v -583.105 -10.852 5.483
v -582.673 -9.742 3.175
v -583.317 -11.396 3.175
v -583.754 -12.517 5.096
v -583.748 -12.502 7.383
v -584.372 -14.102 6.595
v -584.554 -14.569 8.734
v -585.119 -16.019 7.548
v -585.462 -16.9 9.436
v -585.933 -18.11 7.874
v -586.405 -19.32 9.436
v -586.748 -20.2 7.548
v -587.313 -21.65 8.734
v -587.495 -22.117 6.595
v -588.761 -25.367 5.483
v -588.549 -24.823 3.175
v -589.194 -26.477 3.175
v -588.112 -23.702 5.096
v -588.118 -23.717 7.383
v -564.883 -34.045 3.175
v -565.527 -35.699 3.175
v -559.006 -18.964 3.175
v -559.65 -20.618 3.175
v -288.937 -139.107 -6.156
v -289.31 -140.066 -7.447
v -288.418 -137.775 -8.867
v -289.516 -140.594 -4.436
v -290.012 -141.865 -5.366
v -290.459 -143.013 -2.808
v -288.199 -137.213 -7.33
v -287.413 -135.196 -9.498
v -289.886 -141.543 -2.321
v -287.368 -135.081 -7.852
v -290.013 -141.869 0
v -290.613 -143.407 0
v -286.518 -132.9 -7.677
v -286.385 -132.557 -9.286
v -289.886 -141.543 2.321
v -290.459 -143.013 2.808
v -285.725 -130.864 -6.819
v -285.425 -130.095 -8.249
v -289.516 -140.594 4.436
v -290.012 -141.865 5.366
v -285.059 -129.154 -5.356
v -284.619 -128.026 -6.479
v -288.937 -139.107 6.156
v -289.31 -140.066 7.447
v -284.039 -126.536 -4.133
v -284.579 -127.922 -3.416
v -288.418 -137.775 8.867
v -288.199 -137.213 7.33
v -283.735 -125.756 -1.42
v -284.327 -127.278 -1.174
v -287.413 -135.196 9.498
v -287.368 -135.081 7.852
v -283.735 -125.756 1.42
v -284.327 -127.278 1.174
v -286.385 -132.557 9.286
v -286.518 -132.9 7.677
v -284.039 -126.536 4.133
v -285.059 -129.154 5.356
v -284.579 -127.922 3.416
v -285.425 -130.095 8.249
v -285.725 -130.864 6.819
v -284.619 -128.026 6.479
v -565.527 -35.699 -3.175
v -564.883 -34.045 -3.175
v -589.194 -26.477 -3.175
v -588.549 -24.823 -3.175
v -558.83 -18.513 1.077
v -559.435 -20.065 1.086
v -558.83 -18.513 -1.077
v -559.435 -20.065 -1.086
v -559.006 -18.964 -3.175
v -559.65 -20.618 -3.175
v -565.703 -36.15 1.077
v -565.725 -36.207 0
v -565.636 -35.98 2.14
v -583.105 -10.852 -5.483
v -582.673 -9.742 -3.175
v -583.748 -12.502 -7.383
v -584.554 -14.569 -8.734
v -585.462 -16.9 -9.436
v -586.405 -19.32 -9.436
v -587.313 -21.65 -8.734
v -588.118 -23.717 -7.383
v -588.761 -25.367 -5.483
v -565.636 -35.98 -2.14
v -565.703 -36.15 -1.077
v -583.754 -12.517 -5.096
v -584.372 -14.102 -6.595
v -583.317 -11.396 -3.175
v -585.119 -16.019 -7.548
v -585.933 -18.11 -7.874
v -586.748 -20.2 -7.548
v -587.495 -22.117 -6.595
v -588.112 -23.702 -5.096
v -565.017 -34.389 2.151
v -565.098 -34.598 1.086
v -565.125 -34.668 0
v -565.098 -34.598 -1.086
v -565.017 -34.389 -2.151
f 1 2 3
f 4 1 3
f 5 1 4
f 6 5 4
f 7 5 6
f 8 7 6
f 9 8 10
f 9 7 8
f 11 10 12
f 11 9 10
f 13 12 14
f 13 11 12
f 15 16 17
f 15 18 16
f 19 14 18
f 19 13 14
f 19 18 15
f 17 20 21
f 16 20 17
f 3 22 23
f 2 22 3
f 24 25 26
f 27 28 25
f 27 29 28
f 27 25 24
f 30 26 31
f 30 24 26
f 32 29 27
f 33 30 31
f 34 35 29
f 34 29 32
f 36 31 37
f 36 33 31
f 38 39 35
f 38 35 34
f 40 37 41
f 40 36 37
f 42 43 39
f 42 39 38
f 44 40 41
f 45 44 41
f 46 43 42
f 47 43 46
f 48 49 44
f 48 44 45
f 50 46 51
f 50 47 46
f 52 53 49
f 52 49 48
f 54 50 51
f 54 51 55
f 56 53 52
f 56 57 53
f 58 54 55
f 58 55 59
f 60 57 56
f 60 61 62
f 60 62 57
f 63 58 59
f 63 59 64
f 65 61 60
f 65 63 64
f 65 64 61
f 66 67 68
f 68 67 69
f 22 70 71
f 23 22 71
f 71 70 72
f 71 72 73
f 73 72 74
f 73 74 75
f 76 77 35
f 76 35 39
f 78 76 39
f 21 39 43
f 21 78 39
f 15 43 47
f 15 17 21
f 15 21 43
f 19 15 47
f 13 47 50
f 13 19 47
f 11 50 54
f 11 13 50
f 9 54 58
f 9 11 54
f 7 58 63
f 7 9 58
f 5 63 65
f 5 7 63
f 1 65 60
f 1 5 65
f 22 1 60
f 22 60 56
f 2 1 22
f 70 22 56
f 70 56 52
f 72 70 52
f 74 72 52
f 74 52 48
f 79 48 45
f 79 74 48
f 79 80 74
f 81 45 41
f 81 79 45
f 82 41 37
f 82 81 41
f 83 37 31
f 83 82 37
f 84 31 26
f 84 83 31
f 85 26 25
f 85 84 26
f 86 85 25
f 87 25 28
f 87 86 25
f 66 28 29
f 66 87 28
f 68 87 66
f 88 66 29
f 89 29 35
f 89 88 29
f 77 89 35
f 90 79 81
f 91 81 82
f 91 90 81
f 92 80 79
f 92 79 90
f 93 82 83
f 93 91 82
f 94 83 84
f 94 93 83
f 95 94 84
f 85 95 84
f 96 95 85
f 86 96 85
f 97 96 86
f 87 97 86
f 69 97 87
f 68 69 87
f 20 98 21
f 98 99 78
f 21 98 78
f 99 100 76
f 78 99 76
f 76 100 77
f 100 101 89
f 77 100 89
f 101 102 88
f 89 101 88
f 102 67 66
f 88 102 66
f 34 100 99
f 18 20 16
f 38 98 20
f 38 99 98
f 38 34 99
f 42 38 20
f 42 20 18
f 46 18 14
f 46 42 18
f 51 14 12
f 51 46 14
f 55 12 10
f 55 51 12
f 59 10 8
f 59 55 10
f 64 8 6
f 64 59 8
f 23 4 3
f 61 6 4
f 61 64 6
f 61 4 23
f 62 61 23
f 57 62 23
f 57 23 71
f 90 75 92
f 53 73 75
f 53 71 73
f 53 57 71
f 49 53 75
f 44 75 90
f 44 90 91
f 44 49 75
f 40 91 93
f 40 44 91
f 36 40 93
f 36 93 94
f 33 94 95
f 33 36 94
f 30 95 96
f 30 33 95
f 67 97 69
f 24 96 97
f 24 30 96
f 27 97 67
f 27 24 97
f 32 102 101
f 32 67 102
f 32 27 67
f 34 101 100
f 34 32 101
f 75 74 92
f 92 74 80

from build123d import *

# Parameters (mm, degrees)
CUT_EXTRUDE1_START = -3.175
CUT_EXTRUDE1_DEPTH = 6.35


with BuildPart() as part:
    # Sketch1 → Revolve1 (revolve)
    with BuildSketch(Plane.XY):
        Polygon((-290.013124818, -141.869021758), (-290.612556192, -143.407359506), (-589.391523341, -26.984625229), (-588.792091967, -25.446287481), align=None)
    revolve(axis=Axis((-469.305066075, -63.555147651, 0), (-0.931761204, 0.363071699, 0)))

    # Sketch2 → Cut-Extrude1 (cut)
    with BuildSketch(Plane.XY.offset(CUT_EXTRUDE1_START)):
        Polygon((-558.808272896, -18.456595432), (-565.724788753, -36.206646372), (-589.391523341, -26.984625229), (-582.475007484, -9.234574289), align=None)
    extrude(amount=CUT_EXTRUDE1_DEPTH, mode=Mode.SUBTRACT)


solid = part.part
